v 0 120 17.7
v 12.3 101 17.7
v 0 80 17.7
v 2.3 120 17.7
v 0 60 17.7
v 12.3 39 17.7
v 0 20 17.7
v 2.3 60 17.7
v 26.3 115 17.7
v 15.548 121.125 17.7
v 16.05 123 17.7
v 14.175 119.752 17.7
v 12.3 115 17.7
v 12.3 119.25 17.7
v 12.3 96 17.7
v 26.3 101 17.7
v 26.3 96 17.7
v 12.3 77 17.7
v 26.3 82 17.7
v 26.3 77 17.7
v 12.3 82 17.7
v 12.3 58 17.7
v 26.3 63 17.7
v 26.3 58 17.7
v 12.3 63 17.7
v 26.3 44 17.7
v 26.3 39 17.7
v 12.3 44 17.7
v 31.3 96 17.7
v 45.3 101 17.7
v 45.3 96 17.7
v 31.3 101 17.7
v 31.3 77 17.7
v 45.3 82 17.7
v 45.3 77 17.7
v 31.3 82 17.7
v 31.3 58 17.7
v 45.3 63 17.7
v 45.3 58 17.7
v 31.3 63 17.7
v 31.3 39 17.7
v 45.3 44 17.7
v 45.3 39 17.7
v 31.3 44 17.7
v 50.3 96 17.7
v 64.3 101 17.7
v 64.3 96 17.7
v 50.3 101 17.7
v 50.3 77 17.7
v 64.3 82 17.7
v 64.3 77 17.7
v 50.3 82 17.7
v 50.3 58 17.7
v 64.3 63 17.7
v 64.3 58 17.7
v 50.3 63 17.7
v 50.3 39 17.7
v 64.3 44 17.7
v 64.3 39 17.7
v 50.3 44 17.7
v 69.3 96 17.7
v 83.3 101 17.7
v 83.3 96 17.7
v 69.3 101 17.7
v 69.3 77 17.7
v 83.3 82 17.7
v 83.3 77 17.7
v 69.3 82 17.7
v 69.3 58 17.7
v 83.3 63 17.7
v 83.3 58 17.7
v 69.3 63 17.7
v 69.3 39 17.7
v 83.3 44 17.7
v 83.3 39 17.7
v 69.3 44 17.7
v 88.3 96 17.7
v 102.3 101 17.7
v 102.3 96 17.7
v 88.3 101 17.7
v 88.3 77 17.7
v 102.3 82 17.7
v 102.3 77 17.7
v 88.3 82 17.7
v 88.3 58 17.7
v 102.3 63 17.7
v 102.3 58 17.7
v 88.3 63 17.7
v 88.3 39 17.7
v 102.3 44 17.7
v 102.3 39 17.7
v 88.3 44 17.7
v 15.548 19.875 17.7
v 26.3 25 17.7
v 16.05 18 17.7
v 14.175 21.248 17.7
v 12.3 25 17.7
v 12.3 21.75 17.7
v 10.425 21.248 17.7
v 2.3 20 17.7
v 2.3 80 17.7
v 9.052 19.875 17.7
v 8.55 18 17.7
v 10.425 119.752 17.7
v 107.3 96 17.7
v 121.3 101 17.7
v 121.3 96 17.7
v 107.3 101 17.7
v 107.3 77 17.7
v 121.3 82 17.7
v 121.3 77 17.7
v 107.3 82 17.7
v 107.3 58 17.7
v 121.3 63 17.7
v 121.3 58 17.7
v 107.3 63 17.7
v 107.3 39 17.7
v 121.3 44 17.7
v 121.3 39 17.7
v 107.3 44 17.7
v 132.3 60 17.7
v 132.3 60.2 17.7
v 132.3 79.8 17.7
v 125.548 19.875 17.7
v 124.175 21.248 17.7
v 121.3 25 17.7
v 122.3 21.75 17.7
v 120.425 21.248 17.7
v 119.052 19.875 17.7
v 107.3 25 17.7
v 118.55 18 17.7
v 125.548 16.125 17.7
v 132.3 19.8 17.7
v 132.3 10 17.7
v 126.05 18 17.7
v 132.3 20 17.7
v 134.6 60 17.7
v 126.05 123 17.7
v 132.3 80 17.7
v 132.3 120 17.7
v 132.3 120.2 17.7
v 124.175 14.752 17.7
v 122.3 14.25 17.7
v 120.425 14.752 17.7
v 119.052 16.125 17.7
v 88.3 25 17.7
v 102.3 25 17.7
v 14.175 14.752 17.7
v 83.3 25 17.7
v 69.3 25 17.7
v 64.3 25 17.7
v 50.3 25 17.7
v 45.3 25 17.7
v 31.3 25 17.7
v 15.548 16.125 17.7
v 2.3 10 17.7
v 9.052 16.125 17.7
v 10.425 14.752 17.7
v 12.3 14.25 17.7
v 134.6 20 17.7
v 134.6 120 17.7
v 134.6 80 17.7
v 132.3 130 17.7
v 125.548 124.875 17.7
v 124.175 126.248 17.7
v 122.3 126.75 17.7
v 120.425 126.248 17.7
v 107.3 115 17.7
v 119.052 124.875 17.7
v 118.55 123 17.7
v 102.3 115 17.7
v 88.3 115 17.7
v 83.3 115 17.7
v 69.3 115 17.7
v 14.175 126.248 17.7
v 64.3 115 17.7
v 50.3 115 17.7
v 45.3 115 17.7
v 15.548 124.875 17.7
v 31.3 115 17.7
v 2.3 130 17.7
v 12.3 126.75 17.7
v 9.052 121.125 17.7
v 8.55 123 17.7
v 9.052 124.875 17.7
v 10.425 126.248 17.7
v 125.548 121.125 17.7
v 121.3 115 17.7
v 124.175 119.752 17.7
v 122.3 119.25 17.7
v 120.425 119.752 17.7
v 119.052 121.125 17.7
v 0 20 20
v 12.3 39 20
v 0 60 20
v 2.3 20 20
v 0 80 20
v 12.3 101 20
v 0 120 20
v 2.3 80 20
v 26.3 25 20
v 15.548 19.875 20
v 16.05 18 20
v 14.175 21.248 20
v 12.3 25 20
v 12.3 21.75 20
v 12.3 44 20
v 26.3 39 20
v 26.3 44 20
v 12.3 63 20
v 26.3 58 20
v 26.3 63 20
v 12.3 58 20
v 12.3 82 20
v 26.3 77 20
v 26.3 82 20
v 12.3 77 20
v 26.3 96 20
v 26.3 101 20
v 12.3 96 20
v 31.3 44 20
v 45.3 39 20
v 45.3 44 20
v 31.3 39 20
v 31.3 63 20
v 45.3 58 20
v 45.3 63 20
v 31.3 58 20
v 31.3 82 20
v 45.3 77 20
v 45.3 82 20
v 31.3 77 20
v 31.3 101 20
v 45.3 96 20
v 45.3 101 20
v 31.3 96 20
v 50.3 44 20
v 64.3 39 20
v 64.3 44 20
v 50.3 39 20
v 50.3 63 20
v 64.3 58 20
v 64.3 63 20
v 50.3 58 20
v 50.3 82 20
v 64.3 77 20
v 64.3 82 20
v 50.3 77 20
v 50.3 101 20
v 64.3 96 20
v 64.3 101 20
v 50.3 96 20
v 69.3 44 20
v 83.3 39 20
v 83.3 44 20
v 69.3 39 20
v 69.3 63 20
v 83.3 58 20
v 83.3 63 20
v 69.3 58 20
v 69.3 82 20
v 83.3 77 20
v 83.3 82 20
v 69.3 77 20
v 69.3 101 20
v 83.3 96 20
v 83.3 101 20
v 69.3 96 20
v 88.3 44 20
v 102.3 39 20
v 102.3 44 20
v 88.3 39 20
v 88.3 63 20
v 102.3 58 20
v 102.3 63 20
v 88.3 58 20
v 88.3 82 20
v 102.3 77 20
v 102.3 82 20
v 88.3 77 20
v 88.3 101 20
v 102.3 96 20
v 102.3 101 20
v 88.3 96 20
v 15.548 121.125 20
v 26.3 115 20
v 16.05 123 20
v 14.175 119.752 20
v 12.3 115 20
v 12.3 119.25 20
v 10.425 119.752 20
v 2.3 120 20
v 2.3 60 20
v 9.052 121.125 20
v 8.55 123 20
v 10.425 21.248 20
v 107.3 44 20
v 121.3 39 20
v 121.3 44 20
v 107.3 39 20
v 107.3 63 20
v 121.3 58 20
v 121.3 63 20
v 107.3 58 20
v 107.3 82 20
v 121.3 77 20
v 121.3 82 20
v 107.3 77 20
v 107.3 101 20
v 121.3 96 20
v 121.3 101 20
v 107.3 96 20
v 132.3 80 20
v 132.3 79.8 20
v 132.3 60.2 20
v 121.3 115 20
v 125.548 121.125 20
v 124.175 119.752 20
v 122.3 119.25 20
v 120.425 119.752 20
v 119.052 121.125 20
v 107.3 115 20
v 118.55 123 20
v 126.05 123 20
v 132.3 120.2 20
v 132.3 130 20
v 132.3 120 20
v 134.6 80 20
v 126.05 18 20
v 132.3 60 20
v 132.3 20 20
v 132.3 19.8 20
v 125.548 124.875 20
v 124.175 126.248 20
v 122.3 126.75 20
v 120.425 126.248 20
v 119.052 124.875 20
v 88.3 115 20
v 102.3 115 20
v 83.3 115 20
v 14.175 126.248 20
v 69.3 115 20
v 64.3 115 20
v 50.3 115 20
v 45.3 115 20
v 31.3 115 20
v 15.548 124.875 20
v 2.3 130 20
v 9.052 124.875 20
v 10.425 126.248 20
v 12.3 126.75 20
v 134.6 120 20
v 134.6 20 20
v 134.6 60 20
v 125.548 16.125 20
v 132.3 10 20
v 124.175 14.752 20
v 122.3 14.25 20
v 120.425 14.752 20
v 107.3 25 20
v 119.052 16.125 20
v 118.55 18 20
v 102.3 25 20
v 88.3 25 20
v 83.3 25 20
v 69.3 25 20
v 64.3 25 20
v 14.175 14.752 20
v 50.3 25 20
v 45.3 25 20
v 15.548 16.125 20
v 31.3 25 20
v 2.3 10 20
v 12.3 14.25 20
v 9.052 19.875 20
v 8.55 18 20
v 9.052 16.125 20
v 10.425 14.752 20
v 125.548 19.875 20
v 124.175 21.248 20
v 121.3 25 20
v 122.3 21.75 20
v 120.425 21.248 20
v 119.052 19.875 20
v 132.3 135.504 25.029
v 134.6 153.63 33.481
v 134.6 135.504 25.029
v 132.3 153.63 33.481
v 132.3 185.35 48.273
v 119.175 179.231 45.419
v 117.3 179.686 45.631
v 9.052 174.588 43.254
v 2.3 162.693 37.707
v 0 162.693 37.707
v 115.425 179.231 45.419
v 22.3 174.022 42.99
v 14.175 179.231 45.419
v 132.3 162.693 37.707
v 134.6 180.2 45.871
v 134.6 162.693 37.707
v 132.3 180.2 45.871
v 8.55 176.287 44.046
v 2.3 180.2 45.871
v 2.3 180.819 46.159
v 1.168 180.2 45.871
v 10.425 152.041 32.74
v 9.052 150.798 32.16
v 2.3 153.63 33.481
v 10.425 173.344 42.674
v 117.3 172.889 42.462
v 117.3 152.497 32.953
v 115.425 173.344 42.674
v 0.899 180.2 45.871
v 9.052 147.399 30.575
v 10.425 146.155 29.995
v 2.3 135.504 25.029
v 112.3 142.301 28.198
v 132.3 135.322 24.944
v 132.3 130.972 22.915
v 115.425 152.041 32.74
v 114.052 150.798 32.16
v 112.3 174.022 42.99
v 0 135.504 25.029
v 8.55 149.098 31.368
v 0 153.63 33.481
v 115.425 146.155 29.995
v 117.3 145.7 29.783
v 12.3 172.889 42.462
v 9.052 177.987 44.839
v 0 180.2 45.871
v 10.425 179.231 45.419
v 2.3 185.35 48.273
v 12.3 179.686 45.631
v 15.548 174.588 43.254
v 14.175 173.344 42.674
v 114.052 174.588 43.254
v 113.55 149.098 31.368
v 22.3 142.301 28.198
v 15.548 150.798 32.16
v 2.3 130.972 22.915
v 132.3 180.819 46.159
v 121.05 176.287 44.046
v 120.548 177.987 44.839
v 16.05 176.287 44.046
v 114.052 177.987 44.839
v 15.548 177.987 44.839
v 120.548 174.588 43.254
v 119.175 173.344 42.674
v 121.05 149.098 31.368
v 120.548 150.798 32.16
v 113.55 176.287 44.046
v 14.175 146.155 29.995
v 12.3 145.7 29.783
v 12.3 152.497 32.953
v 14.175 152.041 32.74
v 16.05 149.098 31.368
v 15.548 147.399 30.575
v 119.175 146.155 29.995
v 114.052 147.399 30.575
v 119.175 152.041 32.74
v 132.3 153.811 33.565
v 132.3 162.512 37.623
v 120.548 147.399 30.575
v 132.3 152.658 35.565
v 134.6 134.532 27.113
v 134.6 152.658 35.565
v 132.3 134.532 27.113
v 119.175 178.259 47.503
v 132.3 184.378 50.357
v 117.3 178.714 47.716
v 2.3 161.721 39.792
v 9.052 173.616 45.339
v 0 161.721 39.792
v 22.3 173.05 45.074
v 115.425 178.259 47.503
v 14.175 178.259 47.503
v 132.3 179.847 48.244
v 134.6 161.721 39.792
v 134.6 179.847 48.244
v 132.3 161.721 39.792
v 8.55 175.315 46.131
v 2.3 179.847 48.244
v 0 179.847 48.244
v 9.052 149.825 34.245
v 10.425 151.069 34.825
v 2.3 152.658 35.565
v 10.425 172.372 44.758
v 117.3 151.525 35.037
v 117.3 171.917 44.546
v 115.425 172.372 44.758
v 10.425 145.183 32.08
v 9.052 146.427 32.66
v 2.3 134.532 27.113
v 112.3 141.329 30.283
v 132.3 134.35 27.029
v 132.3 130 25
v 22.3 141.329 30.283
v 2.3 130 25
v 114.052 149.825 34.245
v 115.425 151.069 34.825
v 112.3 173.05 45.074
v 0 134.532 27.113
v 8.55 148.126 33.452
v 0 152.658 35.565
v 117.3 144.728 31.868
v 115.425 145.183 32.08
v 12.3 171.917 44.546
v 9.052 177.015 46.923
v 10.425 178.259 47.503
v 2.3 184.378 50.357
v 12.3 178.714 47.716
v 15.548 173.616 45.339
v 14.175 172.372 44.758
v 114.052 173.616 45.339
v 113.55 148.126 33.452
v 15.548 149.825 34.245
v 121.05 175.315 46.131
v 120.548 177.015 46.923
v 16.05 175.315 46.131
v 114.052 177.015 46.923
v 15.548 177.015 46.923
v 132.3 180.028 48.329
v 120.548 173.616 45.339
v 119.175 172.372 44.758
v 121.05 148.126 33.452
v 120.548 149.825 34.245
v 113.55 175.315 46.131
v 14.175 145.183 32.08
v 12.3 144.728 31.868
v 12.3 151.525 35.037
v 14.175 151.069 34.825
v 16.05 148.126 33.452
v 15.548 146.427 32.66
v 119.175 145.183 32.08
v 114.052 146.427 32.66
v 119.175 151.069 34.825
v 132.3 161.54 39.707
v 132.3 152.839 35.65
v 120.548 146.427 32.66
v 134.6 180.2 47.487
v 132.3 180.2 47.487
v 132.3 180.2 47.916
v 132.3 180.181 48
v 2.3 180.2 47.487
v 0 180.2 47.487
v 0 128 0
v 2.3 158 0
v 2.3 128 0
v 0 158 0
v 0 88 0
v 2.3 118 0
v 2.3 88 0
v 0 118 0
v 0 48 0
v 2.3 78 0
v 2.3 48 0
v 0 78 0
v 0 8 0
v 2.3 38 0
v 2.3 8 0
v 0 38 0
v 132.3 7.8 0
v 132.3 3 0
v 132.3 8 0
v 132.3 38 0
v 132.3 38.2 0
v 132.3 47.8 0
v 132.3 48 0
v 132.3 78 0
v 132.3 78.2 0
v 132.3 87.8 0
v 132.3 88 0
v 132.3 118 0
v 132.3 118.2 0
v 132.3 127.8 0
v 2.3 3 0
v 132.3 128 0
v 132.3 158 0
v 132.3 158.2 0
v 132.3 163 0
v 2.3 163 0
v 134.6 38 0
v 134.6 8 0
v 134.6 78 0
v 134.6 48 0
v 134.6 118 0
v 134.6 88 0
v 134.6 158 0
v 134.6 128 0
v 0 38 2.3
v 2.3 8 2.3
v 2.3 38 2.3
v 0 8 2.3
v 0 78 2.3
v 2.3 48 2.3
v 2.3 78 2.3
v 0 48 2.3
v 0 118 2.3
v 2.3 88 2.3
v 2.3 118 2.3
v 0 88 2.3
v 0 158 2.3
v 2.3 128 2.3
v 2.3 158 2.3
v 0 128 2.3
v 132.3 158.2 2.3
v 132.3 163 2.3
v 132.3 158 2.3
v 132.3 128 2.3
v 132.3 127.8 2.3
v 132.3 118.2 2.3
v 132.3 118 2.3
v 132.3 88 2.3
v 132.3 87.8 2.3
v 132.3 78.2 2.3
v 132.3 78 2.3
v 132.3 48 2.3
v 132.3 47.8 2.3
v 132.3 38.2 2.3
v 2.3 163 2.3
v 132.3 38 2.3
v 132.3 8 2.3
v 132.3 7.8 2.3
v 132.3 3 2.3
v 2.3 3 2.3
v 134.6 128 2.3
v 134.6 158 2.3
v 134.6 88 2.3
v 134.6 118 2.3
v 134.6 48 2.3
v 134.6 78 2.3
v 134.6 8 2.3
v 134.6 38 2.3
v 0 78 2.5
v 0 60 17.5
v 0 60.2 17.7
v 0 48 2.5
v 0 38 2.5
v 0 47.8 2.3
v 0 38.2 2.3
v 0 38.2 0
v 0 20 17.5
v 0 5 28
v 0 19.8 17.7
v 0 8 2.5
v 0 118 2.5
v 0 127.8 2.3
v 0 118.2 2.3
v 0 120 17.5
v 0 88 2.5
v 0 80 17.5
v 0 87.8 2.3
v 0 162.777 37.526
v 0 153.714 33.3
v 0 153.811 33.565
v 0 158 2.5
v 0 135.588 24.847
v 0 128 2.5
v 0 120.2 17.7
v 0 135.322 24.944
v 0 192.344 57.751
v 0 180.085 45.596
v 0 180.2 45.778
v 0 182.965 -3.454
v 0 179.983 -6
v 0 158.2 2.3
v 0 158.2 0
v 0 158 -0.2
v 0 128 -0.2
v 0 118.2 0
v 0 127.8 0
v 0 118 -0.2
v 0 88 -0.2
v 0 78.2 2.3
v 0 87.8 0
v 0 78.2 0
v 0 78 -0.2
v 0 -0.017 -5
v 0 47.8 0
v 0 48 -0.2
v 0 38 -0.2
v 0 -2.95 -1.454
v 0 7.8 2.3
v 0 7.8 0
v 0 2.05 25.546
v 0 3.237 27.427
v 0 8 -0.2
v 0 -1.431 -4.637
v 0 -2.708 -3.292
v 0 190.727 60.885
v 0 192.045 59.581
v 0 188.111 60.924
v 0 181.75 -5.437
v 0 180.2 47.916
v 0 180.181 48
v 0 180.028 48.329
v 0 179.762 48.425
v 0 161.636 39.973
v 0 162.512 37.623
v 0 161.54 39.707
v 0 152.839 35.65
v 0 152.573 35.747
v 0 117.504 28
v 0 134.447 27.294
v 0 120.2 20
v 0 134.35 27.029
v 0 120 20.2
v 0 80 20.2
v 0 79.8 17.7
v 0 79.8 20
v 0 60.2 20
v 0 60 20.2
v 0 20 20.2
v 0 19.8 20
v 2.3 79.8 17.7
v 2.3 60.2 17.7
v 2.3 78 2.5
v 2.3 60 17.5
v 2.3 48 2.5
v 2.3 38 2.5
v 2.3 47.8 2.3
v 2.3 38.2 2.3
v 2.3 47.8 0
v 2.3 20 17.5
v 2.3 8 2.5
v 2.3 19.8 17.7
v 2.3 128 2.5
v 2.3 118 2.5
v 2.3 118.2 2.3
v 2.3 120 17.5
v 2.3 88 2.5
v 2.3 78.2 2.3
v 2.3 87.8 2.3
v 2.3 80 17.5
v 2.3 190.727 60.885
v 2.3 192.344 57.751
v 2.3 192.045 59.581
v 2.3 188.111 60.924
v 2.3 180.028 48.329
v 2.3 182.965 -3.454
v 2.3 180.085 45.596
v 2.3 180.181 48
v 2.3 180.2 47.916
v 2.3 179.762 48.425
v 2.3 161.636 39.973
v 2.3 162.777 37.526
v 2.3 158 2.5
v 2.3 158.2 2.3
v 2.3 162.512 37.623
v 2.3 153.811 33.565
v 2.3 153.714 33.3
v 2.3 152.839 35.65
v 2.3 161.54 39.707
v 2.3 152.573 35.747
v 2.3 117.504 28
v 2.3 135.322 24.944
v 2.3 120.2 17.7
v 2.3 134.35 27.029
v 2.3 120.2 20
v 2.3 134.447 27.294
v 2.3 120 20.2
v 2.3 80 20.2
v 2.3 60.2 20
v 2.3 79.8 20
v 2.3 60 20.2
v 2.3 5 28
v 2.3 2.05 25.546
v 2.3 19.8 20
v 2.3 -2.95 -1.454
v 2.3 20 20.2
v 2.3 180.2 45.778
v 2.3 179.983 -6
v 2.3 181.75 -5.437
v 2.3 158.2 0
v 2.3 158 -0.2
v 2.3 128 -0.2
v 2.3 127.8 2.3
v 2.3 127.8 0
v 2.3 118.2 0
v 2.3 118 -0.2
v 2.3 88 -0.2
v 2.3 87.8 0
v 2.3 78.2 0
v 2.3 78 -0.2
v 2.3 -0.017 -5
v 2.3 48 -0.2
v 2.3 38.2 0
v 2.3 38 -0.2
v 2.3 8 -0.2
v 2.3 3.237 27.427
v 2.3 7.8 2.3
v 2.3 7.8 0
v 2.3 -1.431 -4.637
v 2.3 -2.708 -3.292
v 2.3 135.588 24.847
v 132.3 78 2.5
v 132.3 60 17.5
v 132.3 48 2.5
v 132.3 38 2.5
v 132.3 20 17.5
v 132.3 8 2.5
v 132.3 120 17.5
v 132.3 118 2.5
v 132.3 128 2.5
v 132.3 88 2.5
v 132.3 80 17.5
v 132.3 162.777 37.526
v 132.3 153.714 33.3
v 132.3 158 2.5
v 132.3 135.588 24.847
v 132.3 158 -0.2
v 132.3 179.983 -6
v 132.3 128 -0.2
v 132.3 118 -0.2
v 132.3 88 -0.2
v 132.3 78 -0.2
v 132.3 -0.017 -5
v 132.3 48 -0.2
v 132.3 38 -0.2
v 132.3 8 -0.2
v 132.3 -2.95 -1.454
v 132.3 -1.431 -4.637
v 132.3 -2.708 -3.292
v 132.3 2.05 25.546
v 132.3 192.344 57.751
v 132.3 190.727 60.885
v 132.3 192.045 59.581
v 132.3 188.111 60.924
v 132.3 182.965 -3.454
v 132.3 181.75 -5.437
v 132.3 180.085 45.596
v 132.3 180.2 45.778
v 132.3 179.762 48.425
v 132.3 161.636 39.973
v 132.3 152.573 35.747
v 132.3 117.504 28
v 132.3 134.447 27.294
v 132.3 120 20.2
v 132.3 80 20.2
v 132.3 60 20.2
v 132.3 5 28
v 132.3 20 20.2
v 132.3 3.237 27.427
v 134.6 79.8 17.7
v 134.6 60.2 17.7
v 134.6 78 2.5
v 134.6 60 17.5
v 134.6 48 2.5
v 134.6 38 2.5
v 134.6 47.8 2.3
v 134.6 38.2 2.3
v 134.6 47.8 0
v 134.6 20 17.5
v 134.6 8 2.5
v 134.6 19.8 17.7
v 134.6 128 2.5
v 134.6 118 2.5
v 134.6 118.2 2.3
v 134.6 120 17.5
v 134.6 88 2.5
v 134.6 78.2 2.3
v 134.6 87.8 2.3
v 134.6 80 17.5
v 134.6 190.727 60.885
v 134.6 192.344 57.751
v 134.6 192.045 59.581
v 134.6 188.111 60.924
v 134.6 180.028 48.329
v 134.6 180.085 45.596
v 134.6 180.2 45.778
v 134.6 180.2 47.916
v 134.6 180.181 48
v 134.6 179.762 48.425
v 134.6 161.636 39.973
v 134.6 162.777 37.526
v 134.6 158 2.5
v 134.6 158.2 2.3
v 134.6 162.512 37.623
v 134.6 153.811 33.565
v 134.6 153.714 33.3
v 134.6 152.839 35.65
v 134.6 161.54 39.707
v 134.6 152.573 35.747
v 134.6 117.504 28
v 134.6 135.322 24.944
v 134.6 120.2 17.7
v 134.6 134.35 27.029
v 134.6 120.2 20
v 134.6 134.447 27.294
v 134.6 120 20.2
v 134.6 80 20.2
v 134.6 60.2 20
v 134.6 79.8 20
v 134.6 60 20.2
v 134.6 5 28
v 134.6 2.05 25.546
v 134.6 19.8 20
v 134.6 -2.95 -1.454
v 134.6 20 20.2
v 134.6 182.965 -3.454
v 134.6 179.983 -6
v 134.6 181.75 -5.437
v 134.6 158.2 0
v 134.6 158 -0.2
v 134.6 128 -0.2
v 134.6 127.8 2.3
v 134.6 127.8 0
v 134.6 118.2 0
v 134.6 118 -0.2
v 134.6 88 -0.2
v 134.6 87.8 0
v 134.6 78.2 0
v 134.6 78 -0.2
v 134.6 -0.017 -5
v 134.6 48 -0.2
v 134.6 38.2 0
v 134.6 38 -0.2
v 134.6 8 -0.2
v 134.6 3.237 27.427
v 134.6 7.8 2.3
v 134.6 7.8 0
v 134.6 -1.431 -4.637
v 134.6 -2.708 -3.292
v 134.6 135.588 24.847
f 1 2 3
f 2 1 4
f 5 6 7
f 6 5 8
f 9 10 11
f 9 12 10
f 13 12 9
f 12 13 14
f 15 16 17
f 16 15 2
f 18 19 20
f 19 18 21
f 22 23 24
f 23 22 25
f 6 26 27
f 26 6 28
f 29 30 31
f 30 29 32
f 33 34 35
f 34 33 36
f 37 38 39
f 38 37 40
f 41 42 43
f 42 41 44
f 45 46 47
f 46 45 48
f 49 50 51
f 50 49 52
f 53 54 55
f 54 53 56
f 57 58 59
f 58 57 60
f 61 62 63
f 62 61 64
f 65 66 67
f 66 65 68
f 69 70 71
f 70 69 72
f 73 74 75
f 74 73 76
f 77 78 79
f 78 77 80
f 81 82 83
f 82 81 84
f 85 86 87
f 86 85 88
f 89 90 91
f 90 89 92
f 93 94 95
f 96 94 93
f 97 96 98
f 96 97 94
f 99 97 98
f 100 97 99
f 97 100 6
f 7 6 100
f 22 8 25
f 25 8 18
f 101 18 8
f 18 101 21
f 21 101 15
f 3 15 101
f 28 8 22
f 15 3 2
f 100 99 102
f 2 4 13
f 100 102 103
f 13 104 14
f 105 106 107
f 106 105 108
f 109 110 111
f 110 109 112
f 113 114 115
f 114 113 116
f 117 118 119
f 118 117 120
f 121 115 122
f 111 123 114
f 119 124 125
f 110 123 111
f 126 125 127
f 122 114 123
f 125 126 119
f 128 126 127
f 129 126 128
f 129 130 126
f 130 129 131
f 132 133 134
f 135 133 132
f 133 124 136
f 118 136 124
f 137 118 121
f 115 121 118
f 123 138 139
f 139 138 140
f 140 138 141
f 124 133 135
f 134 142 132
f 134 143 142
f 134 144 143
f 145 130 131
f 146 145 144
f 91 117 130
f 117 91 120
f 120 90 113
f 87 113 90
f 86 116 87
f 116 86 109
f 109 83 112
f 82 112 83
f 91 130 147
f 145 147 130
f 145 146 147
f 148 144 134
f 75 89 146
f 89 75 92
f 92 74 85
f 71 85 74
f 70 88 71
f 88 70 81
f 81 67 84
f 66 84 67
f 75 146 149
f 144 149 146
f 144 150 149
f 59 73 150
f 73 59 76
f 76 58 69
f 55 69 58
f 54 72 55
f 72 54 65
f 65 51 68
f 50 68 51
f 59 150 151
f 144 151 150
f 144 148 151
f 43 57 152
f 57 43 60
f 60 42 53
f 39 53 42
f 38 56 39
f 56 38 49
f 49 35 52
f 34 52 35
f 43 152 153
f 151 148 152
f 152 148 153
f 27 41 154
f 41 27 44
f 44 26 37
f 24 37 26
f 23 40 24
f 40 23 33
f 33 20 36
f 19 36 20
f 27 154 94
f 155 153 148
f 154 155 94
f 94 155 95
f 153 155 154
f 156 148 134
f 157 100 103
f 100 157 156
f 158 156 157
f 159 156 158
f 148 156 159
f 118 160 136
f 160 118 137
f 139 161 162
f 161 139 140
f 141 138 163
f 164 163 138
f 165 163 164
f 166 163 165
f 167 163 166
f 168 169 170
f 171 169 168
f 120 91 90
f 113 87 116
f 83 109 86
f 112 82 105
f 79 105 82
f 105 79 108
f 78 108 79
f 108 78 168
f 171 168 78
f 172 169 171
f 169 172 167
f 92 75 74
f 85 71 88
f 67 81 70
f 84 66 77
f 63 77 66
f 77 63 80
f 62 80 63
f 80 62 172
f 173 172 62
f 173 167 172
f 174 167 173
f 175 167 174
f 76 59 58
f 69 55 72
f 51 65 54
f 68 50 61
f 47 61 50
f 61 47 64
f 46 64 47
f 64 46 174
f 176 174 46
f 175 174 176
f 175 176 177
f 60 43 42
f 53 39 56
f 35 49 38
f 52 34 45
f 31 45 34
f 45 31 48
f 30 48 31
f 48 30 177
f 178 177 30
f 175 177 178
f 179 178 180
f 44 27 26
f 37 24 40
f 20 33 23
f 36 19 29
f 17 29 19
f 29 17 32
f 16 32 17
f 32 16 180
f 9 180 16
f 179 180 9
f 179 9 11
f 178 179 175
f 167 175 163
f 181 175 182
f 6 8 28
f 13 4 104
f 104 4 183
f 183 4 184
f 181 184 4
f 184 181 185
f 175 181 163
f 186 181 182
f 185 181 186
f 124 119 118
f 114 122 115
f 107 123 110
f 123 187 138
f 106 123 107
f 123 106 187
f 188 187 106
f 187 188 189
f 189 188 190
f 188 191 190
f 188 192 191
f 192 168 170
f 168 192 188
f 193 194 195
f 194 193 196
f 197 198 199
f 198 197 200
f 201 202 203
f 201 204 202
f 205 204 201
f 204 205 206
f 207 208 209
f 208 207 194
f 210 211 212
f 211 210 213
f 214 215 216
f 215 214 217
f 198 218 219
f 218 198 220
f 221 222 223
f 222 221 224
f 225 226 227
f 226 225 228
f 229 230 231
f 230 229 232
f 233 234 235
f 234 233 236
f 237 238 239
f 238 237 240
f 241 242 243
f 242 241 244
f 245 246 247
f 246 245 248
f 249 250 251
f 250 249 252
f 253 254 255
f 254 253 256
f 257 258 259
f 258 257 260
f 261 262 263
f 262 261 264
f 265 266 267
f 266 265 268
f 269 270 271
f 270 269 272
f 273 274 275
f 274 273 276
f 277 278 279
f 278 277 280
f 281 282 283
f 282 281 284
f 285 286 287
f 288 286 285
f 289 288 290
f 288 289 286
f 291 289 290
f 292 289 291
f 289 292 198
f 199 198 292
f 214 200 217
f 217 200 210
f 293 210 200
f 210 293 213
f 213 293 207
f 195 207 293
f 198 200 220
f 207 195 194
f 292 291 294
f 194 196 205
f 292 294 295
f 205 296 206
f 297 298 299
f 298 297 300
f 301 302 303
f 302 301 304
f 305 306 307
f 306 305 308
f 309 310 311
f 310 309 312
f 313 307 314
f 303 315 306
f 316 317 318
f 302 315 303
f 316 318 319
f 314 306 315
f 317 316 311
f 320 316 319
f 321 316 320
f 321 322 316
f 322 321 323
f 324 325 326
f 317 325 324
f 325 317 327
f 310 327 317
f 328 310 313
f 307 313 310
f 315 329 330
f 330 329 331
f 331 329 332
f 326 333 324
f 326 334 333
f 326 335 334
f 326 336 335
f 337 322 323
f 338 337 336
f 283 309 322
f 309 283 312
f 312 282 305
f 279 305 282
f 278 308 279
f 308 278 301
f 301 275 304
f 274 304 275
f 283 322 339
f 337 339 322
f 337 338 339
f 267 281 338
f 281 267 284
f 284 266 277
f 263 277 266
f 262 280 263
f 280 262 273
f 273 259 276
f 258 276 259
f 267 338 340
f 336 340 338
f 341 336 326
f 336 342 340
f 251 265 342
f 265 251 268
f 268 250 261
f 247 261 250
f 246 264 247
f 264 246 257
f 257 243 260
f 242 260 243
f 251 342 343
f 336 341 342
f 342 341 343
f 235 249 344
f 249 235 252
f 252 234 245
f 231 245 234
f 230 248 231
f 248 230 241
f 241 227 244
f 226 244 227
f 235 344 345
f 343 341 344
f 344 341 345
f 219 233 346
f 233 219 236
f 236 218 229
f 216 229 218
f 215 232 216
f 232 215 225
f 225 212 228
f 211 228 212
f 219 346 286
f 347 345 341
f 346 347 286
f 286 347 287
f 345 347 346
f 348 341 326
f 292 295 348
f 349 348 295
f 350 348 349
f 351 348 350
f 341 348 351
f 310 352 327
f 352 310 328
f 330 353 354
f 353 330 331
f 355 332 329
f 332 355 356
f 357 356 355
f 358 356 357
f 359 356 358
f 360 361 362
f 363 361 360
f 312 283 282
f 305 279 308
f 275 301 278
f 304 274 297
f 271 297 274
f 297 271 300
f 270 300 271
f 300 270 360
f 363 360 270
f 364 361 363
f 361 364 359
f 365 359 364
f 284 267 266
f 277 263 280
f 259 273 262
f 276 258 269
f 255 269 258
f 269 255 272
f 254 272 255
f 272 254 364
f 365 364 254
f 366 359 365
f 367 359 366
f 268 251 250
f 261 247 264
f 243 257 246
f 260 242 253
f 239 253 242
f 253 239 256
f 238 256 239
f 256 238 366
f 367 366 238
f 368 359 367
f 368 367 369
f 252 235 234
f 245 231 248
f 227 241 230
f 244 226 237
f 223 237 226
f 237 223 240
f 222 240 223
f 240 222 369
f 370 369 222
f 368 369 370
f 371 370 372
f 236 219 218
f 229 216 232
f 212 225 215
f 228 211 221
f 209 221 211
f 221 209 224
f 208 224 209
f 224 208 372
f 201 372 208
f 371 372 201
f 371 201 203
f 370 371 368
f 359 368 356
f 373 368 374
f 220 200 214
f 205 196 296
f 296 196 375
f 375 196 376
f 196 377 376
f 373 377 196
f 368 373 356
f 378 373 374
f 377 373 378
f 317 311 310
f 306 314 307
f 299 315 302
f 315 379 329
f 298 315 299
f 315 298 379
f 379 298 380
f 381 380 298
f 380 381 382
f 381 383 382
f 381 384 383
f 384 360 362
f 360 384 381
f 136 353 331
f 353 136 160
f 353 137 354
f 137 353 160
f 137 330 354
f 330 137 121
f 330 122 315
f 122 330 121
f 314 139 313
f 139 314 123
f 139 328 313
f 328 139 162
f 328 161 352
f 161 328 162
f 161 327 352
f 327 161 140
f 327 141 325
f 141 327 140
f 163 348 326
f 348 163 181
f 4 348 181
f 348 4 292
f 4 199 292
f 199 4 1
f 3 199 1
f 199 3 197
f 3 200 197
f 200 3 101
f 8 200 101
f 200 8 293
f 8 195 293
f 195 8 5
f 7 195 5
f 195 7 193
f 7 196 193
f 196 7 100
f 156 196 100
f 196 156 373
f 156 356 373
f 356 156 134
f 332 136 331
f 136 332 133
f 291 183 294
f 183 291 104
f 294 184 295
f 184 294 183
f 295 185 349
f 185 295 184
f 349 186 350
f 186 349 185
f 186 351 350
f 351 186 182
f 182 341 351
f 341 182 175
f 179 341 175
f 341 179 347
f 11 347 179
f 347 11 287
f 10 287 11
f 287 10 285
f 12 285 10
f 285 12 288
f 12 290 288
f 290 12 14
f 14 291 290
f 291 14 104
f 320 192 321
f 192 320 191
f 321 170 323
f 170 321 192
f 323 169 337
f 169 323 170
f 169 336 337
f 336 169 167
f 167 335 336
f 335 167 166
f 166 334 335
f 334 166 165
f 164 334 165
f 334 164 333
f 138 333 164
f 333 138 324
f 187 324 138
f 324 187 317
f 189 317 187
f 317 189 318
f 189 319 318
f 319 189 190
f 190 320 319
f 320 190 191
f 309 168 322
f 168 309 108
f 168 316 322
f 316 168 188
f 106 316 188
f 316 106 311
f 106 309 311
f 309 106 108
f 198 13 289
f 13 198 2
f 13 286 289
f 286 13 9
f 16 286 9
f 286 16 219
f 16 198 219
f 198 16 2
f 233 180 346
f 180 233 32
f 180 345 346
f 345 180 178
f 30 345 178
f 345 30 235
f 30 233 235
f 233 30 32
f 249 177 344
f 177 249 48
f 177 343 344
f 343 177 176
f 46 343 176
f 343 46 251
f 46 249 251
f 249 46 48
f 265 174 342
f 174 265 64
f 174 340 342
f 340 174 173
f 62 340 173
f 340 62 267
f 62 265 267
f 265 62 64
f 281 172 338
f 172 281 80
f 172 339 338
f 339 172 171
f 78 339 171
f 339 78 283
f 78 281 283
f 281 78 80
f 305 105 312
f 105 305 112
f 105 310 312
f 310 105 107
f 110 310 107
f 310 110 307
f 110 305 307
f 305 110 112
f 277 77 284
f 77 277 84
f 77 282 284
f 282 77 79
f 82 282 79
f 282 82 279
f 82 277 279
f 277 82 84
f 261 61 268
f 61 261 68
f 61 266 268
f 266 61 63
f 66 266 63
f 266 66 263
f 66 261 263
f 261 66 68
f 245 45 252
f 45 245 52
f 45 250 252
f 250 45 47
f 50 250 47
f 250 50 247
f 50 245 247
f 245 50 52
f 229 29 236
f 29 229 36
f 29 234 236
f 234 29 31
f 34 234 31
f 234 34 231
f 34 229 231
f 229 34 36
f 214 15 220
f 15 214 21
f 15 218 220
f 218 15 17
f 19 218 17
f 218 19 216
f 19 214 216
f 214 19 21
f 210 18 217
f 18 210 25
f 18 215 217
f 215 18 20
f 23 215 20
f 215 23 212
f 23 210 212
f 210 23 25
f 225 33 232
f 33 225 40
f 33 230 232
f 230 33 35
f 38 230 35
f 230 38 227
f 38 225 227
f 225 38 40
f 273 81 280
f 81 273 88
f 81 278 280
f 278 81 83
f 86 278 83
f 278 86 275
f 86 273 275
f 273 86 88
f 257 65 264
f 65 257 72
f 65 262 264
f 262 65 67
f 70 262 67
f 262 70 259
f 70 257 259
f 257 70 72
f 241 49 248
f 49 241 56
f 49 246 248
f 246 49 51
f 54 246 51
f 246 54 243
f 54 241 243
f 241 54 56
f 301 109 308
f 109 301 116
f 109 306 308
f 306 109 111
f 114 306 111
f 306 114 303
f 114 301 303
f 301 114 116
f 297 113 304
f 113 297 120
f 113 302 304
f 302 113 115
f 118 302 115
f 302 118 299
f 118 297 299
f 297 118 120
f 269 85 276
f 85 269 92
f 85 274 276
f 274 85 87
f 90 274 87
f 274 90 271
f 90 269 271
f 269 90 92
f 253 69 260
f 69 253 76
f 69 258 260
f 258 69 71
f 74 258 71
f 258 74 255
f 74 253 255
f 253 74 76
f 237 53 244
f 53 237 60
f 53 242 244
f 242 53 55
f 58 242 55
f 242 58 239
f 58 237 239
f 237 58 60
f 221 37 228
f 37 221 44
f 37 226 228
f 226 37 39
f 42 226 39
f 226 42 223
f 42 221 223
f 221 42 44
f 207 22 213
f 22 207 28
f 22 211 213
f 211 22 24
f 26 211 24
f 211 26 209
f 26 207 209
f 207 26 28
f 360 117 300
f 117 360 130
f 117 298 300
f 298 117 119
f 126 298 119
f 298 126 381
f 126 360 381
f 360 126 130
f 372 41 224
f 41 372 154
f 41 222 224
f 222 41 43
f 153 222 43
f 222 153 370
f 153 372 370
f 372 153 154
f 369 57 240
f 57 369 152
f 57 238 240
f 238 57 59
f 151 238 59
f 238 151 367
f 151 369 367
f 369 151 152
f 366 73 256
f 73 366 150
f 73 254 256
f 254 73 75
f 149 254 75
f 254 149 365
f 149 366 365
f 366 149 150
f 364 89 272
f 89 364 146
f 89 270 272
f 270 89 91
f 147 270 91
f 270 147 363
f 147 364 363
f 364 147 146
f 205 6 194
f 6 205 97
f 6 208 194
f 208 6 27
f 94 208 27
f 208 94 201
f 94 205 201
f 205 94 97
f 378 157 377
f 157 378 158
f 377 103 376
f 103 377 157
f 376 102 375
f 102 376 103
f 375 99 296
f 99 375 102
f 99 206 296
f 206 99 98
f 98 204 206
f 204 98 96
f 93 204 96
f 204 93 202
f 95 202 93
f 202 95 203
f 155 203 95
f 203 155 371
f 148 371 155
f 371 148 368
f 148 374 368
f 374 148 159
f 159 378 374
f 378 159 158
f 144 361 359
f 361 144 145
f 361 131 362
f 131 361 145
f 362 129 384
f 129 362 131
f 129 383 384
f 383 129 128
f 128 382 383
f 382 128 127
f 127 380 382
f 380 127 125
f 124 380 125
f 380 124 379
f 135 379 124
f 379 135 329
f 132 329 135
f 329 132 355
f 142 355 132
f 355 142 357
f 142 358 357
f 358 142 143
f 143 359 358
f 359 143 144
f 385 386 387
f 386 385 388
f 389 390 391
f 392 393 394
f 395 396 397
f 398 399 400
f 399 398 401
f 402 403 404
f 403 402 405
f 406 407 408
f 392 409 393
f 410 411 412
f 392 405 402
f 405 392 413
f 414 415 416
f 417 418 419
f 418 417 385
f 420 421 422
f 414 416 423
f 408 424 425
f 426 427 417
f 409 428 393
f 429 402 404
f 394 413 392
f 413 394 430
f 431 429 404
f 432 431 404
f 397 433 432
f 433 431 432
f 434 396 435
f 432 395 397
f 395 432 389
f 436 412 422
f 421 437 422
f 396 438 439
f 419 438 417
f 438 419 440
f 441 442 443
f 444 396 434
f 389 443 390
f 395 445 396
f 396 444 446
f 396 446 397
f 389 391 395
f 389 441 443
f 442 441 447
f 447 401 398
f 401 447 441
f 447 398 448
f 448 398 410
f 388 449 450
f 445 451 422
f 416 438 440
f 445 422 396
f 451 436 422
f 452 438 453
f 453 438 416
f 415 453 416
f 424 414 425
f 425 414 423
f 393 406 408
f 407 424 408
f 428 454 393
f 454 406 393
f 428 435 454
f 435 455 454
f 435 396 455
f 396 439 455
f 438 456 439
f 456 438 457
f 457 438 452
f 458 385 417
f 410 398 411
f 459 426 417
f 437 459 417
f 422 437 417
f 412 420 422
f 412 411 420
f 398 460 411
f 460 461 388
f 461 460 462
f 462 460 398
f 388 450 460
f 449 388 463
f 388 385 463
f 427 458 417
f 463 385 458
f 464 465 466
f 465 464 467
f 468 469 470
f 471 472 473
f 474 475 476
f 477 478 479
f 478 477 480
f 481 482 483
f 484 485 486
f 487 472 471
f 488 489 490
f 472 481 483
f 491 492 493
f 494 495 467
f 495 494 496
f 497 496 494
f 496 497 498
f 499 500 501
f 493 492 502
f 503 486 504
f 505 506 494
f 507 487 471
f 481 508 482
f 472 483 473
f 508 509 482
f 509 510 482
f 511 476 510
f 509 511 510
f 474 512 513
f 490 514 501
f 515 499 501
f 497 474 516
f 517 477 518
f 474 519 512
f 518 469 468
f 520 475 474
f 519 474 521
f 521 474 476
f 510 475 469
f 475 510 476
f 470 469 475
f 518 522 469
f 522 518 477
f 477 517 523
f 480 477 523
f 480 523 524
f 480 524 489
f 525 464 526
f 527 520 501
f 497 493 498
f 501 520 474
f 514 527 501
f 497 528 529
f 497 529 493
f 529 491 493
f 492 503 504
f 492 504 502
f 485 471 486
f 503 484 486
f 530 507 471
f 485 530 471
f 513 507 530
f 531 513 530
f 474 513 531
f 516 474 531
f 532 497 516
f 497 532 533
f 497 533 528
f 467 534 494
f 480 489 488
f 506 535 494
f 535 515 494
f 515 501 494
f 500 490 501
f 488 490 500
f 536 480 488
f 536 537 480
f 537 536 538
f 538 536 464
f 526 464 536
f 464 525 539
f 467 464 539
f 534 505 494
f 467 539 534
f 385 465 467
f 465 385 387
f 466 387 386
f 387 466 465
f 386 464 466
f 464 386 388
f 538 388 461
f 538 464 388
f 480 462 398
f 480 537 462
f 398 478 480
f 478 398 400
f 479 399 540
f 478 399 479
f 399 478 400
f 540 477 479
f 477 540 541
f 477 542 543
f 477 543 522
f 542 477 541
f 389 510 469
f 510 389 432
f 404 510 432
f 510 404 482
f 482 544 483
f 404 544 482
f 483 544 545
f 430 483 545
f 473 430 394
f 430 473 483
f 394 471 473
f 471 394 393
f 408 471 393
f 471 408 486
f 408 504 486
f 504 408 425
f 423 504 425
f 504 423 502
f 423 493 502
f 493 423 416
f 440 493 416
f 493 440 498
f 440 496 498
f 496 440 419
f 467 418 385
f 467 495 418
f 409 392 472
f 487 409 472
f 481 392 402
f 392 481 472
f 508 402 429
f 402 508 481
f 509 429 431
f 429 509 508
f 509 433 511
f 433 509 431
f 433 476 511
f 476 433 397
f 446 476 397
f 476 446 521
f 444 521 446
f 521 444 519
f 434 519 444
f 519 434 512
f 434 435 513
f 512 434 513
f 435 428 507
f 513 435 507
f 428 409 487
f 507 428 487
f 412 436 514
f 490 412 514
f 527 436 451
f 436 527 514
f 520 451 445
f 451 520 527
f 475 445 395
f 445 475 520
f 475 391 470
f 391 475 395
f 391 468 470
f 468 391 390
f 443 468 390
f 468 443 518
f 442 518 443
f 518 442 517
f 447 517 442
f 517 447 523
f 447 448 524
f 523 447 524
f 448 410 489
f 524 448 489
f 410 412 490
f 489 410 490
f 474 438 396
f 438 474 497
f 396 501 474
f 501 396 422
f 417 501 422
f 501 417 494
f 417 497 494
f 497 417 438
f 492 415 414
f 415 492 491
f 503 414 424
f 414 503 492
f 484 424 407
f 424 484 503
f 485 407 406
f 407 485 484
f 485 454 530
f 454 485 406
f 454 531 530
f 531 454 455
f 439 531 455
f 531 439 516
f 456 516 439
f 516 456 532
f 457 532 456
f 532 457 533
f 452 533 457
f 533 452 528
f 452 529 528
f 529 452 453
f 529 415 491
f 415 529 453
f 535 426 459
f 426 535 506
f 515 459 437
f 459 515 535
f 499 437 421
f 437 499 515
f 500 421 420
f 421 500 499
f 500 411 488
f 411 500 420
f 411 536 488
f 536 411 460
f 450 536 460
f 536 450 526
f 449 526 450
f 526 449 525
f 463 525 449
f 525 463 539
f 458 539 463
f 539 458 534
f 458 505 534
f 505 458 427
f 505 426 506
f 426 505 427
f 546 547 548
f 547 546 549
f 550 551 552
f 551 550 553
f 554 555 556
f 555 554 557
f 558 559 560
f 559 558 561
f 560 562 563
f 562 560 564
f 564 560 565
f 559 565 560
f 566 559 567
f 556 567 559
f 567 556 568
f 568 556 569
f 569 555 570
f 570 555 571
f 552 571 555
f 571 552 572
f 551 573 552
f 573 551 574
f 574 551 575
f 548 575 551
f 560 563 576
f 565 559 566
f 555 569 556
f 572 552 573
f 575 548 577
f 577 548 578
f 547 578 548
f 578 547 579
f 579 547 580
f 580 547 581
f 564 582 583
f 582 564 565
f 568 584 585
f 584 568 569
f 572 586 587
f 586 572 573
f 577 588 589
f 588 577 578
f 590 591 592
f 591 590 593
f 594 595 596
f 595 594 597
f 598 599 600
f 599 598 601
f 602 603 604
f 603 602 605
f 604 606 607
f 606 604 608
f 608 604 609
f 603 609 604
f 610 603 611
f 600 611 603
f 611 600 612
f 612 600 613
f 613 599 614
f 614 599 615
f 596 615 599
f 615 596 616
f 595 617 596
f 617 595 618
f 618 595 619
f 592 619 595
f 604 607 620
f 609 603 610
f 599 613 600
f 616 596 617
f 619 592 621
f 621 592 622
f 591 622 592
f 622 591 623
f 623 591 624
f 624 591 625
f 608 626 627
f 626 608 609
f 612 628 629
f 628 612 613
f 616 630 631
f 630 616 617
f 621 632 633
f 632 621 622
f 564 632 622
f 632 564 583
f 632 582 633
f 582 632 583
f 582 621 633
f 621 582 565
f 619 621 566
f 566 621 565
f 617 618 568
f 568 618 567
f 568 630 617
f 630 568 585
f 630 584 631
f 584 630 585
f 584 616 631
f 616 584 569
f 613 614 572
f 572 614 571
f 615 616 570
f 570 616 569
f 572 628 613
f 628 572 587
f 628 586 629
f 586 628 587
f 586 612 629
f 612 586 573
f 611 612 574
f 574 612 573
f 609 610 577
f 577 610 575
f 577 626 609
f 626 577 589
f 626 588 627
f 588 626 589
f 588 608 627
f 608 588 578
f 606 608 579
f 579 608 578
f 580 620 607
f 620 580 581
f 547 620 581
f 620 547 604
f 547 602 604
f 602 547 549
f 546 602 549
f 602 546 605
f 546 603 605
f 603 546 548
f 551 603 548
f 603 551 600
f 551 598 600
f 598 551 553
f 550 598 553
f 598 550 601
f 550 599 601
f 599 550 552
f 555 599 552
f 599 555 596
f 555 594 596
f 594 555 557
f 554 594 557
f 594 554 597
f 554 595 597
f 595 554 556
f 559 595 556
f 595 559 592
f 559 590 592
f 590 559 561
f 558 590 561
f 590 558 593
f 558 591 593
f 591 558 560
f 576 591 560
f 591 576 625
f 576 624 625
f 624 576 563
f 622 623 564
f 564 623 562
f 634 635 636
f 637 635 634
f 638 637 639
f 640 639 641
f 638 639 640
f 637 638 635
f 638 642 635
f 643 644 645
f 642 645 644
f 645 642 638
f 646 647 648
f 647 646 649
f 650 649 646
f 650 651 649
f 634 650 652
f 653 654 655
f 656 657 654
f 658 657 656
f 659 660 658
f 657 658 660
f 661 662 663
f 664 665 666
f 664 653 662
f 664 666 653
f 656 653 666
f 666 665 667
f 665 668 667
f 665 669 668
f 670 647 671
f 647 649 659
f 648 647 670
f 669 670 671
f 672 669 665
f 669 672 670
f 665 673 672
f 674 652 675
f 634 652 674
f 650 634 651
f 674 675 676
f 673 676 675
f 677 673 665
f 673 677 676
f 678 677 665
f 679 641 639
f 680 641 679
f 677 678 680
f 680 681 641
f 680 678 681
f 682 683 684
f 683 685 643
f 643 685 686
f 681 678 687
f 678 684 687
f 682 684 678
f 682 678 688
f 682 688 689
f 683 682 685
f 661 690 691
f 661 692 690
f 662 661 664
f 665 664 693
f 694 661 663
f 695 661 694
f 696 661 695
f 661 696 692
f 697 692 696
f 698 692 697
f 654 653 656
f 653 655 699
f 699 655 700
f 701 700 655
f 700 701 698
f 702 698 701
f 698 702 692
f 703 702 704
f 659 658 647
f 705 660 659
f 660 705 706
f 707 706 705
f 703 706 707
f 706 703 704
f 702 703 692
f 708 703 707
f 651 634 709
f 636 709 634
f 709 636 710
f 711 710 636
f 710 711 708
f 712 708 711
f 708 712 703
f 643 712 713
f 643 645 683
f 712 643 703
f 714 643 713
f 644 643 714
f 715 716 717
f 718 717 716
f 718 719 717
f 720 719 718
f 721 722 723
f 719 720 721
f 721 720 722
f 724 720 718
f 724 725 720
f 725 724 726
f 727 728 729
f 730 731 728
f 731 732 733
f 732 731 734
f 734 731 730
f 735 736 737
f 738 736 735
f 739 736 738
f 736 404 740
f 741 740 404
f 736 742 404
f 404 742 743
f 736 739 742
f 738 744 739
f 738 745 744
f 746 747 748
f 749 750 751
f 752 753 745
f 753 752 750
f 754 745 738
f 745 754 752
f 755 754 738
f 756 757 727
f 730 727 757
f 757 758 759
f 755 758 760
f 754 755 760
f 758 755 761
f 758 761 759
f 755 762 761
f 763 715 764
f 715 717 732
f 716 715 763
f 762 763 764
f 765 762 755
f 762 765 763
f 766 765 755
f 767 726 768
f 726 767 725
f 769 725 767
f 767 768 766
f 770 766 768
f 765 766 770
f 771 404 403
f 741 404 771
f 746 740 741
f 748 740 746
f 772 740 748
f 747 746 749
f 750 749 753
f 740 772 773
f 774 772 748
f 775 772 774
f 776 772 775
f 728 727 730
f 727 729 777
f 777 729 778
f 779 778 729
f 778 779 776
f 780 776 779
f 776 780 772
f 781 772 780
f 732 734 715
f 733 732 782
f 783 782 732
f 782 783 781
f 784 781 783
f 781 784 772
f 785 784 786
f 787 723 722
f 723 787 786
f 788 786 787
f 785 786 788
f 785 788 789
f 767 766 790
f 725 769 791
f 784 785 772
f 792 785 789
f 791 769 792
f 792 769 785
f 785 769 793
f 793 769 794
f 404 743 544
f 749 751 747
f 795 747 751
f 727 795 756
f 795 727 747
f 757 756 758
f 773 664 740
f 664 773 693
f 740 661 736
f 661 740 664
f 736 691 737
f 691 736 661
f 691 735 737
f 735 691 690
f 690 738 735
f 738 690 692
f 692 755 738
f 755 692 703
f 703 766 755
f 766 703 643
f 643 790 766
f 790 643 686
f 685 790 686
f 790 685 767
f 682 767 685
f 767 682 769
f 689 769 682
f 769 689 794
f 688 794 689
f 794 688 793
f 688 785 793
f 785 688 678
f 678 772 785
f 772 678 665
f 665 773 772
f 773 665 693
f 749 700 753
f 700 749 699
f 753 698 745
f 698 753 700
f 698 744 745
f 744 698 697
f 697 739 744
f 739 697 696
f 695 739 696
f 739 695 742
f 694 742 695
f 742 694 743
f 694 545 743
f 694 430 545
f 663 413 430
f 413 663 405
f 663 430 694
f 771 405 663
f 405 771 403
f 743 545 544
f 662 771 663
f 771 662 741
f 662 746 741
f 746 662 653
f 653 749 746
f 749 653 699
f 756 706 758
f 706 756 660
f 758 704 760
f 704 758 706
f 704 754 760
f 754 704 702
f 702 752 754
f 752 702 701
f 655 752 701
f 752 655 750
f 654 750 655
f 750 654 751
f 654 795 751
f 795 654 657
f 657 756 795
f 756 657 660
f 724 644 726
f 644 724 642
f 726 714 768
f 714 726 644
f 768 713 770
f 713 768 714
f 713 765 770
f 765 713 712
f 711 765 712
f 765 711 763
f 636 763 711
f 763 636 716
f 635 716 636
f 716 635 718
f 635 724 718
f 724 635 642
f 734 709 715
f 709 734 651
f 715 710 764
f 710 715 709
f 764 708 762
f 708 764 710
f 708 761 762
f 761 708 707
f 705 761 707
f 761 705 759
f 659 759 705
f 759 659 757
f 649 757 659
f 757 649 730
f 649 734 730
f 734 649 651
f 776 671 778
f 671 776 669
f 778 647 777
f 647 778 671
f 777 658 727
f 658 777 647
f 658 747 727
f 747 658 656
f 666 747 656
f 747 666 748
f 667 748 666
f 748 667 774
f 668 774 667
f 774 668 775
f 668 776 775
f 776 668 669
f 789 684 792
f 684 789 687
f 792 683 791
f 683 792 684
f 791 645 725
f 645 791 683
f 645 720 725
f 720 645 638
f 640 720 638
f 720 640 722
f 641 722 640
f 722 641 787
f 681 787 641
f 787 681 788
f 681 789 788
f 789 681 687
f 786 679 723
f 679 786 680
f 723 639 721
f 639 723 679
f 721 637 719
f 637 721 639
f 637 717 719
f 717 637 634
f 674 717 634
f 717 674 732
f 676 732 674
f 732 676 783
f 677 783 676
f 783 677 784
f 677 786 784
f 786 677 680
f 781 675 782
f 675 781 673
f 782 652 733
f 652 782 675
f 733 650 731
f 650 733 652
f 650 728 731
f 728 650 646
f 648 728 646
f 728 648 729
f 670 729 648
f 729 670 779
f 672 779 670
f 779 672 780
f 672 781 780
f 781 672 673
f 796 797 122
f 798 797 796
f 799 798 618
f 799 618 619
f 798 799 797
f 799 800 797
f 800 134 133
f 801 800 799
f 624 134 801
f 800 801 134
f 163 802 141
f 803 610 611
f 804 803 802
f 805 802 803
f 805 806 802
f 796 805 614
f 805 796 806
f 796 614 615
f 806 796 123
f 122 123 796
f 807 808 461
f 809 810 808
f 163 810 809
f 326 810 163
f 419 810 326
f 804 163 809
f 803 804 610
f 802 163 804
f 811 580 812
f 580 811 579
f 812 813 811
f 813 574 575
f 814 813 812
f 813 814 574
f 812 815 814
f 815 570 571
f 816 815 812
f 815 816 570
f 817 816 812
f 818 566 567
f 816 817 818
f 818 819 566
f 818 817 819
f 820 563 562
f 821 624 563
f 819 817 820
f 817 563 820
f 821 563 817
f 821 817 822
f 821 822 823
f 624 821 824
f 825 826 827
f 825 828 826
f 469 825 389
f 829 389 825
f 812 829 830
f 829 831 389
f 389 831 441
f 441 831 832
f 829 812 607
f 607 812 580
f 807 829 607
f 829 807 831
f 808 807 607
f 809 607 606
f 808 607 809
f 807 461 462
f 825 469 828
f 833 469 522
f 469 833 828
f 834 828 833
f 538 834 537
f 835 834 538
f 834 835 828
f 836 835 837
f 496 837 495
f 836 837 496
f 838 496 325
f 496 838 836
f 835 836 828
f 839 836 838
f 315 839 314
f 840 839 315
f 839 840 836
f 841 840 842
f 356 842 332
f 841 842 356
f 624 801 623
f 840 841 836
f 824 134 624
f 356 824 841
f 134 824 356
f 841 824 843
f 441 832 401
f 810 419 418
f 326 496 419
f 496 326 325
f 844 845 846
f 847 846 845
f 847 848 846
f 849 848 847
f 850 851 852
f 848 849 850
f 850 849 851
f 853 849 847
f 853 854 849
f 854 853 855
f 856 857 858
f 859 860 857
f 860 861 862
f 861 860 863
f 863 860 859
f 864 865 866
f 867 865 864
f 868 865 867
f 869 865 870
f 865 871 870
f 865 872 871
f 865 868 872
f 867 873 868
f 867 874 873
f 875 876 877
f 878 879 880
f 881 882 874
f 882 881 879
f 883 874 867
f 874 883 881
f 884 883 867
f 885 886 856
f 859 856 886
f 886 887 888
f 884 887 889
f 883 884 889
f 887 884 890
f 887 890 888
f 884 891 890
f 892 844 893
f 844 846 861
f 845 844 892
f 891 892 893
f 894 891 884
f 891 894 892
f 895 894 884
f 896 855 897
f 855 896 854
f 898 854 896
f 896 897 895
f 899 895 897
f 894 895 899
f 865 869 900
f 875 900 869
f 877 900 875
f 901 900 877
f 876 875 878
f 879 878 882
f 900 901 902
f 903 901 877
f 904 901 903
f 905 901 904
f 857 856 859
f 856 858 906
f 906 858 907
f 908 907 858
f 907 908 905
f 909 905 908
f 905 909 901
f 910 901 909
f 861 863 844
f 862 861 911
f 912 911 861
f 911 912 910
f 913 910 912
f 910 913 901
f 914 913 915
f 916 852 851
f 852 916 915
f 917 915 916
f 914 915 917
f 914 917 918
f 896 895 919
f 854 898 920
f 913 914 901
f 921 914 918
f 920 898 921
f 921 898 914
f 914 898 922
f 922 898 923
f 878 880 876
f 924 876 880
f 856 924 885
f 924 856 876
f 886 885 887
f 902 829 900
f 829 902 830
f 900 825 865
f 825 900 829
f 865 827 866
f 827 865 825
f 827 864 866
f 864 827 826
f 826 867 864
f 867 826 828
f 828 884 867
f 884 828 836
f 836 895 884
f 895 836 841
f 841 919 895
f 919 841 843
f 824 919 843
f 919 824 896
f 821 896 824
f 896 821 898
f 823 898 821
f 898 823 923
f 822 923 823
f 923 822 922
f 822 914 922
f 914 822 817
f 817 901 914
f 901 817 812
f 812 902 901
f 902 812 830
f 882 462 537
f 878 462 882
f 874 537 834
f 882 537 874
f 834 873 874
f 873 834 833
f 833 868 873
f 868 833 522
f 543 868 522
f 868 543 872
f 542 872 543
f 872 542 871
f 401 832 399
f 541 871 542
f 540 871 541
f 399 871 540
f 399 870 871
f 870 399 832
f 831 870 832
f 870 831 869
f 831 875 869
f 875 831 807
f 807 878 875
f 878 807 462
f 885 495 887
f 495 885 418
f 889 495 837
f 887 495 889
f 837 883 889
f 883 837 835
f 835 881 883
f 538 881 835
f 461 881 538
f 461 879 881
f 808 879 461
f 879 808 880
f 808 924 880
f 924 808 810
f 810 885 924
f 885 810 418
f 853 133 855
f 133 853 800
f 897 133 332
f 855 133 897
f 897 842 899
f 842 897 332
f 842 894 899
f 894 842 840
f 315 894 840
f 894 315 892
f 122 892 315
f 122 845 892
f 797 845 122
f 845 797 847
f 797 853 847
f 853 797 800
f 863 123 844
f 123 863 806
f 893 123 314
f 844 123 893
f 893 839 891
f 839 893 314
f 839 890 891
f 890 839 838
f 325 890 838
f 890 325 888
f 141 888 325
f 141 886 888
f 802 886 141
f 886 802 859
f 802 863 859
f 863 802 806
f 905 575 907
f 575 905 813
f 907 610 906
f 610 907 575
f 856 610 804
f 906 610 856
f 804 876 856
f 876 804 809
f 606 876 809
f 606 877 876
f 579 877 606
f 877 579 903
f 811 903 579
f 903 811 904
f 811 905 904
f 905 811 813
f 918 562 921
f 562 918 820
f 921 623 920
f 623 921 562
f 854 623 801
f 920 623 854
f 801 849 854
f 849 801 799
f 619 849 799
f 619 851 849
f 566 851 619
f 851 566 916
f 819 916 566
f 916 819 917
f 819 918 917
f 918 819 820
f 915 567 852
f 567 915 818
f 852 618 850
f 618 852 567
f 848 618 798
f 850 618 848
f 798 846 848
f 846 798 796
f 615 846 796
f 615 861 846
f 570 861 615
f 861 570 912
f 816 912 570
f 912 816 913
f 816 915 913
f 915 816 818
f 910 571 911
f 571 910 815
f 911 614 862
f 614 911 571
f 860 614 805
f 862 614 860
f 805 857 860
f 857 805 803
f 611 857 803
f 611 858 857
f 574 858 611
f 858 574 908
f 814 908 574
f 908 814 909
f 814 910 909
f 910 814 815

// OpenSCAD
overall_footprint = [130, 180];
// Thickness of the stock to laser cut
stock_thickness = 2.3;

// Diameter of mounting holes
hole_diameter = 3.75;

// overhang of side panels beyond plates
side_allowance = 5;

keypad_plate_height = 20;
display_plate_height = 25;
display_angle = 25;

front_inset = 10;
back_inset = 10;
base_inset = 3;

display_back_distance = 130;

tab_length = 40;
tab_depth = stock_thickness;
tab_tolerance = .2;

keypad_width = 130;
keypad_height = 115;

display_height = 60;

display_dimensions = [90,35];

function display_top_coords() = [0,display_back_distance + cos(display_angle) * display_height,display_plate_height + sin(display_angle) * display_height];

module mounting_holes_2d(rows, columns, spacing) {
    for(row=[0:rows-1], col=[0:columns-1]) {
        translate([col * spacing.x, row * spacing.y])
            circle(hole_diameter);
    }
}

module tabs2d(plate_dimensions, num_tabs, tab_length, end_spacing) {
    tab_spacing = (plate_dimensions.y - 2*end_spacing - num_tabs*tab_length)/(num_tabs-1);
    for(tab=[0:num_tabs-1]) {
        translate([-tab_depth, end_spacing + (tab_length+tab_spacing) * tab, 0])
        square([plate_dimensions.x+2*tab_depth, tab_length]);
    }
}

module keypad_plate() {
    key_rows = 5;
    key_cols = 6;

    key_width = 14;
    key_height = key_width;

    mounting_hole_spacing = [110, 105];

    module plate_frame(size) {
        square([size.x,size.y]);
        // two tabs on each side
        tabs2d([size.x,size.y], 2, 40, 10);
    }

    module key_array(rows, columns, spacing) {
        for(row=[0:rows-1], col=[0:columns-1]) {
            translate([col * (key_width + spacing), row * (key_width + spacing),0])
                square([key_width, key_height]);
        }
    }

    difference() {
        plate_frame([keypad_width,120]);
        translate([10,15])key_array(key_rows,key_cols,5);
        translate([10,8])mounting_holes_2d(2, 2, mounting_hole_spacing);
    }
}

module display_plate(size) {
    module display_frame(size) {
        square(size);
        tabs2d(size, 2, 20, 5);
    }

    difference() {
        display_frame([size.x,size.y]);
        translate([size.x/2,size.y/2])square(display_dimensions, center=true);
        translate([10, 20])mounting_holes_2d(2, 2, [105, 30]);
    }
    
}

module base_plate(size) {
    square(size);
    tabs2d(size, 4, 30, 5);
}
 
module mounting_plates() {
    translate([tab_depth,0,0]){
        color("BurlyWood"){
            // Keypad Plate
            translate([0, front_inset, keypad_plate_height - stock_thickness])
                linear_extrude(stock_thickness)
                keypad_plate();
            
            // Display Plate
            translate([0,display_back_distance,display_plate_height])
                rotate([display_angle,0,0])
                translate([0,0,-stock_thickness])
                linear_extrude(stock_thickness)
                display_plate([keypad_width, display_height]);
        }
        
        color("DimGray")
            // Base Plate
            translate([0, base_inset, 0])
            linear_extrude(stock_thickness)
            base_plate([keypad_width, overall_footprint.y - front_inset - back_inset]);
    }
}

module side_panel() {
    module slots2d() {
        offset(tab_tolerance)projection()intersection() {
            translate([0,0,-(overall_footprint.x + tab_depth + 1)])rotate([0,0,-90])rotate([0,-90,0])mounting_plates();
            cube([overall_footprint.y, display_top_coords().z, 2]);
        }
    }
    
    module side_polygon() {
        d2 = display_plate_height - (keypad_plate_height + side_allowance);
        d3 = side_allowance/cos(display_angle);
        x = (d2+d3)/tan(display_angle);
        hard_point_1 = [display_back_distance - x, keypad_plate_height + side_allowance];
        
        d4 = side_allowance / sin(display_angle);
        d5 = (side_allowance + d4) * tan(display_angle);
        y = display_top_coords().z + d5;
        hard_point_2 = [display_top_coords().y + side_allowance, y];

        offset(3)polygon([
        [0,base_inset - side_allowance],
        [front_inset - side_allowance,keypad_plate_height + side_allowance],
        hard_point_1,
        hard_point_2, 
        [overall_footprint.y,-base_inset]
        ]);
    }
    rotate([0,90,0])rotate([0,0,90])
    linear_extrude(stock_thickness)difference() {
        side_polygon();
        slots2d();
    }
}
color("Sienna"){
    side_panel();
    translate([keypad_width+tab_depth,0,0])side_panel();
}
mounting_plates();
